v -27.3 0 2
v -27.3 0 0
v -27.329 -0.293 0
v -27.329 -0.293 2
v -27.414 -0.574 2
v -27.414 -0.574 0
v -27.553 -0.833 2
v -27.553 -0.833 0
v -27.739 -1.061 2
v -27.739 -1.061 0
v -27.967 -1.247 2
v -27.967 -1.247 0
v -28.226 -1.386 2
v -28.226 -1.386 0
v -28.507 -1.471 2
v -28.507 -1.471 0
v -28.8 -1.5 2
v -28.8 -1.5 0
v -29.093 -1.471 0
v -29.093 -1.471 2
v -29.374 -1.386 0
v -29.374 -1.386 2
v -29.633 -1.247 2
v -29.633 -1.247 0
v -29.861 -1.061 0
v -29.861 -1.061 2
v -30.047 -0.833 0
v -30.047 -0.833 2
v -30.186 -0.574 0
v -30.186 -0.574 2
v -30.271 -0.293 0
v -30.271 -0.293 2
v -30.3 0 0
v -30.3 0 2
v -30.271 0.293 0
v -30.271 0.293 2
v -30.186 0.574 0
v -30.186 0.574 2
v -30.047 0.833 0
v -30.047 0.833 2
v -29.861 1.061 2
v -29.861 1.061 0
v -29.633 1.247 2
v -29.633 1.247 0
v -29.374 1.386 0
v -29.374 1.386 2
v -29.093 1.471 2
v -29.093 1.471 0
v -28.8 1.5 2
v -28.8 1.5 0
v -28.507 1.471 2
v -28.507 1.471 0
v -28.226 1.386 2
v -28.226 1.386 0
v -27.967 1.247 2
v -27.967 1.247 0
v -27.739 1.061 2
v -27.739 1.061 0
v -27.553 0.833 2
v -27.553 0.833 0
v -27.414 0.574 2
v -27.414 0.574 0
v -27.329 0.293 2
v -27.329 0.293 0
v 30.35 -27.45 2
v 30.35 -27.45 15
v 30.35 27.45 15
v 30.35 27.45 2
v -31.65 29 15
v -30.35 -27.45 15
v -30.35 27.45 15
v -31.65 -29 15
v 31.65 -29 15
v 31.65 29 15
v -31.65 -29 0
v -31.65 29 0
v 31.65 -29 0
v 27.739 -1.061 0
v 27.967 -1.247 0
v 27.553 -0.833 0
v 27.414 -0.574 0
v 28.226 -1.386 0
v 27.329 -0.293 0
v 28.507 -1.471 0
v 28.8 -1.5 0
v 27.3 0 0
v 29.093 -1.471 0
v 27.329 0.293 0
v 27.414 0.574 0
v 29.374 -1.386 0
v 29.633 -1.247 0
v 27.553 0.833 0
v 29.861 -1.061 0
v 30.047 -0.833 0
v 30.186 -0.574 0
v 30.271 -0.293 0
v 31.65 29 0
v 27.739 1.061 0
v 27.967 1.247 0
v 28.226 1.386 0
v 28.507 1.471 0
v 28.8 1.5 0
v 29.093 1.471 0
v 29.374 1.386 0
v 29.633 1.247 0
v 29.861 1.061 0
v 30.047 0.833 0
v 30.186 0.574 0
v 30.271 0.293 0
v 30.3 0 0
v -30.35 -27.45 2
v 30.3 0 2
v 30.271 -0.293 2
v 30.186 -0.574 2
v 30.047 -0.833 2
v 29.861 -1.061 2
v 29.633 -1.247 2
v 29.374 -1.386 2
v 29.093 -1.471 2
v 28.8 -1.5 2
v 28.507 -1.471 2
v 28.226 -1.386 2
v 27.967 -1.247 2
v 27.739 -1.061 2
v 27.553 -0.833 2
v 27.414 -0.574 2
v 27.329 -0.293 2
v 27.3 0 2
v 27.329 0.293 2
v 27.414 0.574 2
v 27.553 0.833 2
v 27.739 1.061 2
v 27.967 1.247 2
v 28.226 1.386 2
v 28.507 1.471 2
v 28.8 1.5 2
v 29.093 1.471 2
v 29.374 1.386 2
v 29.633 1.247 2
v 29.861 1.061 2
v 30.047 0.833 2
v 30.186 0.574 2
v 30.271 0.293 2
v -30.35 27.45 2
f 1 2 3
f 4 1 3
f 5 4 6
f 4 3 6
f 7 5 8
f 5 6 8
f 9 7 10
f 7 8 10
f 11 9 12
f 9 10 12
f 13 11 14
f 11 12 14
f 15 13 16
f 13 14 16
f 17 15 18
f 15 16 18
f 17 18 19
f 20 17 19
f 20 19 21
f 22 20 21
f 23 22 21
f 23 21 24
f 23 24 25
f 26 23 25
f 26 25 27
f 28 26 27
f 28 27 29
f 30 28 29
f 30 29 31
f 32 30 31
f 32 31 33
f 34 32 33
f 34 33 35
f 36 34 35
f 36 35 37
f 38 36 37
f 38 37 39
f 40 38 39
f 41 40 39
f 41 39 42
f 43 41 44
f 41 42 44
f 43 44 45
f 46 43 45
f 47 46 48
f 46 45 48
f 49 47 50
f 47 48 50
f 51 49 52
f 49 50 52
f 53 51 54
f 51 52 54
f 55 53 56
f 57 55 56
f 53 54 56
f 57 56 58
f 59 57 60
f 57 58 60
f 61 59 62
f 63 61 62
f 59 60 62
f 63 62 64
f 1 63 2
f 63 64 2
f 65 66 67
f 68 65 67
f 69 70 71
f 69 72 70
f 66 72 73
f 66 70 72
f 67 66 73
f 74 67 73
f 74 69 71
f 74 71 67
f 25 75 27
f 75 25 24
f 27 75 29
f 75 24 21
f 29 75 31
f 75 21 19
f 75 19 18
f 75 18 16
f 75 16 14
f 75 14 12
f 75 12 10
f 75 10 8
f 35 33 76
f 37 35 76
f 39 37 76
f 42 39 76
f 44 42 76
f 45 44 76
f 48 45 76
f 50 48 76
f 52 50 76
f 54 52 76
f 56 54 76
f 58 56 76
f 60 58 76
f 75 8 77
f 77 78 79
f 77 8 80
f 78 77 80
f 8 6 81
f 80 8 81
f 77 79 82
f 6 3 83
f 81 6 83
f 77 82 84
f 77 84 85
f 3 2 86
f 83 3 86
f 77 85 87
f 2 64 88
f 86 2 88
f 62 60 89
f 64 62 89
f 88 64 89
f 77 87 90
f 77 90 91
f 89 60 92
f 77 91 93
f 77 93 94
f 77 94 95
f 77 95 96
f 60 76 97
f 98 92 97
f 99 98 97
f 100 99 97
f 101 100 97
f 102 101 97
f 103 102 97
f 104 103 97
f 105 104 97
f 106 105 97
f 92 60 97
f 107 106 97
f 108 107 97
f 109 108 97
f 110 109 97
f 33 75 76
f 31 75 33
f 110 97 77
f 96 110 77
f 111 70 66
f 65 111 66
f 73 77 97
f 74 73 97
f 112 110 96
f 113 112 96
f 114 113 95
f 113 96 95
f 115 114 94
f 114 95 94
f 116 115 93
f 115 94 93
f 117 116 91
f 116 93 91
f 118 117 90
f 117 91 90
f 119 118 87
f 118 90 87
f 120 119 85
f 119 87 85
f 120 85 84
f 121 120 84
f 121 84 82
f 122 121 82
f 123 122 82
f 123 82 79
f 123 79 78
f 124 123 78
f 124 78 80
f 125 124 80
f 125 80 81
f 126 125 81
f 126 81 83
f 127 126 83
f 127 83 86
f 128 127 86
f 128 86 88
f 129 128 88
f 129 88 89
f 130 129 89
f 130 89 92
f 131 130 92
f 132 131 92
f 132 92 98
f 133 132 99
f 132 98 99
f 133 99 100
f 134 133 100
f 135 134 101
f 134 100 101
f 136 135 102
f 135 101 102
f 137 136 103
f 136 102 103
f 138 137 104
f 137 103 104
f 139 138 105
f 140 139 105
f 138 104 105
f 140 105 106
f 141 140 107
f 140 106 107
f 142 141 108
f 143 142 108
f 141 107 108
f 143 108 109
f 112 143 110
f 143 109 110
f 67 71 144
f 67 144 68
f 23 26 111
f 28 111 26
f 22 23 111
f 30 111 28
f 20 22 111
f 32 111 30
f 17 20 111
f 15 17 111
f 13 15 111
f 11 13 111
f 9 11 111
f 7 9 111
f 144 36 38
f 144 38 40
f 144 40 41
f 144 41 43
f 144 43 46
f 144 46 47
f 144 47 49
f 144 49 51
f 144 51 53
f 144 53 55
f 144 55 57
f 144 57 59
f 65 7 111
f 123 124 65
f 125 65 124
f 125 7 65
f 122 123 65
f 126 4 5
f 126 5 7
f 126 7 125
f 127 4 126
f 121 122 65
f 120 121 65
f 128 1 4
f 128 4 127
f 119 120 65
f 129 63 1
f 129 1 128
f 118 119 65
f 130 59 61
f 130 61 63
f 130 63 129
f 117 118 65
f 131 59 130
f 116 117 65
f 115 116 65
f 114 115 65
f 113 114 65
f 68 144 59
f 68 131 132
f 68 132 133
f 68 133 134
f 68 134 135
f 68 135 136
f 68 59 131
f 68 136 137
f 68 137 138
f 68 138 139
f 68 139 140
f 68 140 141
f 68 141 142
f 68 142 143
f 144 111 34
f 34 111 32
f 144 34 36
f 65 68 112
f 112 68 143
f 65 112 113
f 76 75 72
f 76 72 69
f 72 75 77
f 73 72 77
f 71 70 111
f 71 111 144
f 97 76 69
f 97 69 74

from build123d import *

# Parameters (mm, degrees)
F0_W     = 63.3
F0_H     = 58
F1_DEPTH = 15
F2_W     = 60.7
F2_H     = 54.9
F3_DEPTH = 13
F4_R     = 1.5
F5_DEPTH = 15.001


with BuildPart() as f1:
    # F0 (on Top) → F1 (new body)
    with BuildSketch(Plane.XY):
        Rectangle(F0_W, F0_H)
    extrude(amount=F1_DEPTH)

    # F2 (on face) → F3 (cut)
    with BuildSketch(Plane.XY.offset(15)):
        Rectangle(F2_W, F2_H)
    extrude(amount=-F3_DEPTH, mode=Mode.SUBTRACT)

    # F4 (on face) → F5 (cut, through all)
    with BuildSketch(Plane(origin=(0, 0, 0), x_dir=(1, 0, 0), z_dir=(0, 0, -1))):
        with Locations((28.8, 0)):
            Circle(F4_R)
        with Locations((-28.8, 0)):
            Circle(F4_R)
    extrude(amount=-F5_DEPTH, mode=Mode.SUBTRACT)


solid = f1.part
